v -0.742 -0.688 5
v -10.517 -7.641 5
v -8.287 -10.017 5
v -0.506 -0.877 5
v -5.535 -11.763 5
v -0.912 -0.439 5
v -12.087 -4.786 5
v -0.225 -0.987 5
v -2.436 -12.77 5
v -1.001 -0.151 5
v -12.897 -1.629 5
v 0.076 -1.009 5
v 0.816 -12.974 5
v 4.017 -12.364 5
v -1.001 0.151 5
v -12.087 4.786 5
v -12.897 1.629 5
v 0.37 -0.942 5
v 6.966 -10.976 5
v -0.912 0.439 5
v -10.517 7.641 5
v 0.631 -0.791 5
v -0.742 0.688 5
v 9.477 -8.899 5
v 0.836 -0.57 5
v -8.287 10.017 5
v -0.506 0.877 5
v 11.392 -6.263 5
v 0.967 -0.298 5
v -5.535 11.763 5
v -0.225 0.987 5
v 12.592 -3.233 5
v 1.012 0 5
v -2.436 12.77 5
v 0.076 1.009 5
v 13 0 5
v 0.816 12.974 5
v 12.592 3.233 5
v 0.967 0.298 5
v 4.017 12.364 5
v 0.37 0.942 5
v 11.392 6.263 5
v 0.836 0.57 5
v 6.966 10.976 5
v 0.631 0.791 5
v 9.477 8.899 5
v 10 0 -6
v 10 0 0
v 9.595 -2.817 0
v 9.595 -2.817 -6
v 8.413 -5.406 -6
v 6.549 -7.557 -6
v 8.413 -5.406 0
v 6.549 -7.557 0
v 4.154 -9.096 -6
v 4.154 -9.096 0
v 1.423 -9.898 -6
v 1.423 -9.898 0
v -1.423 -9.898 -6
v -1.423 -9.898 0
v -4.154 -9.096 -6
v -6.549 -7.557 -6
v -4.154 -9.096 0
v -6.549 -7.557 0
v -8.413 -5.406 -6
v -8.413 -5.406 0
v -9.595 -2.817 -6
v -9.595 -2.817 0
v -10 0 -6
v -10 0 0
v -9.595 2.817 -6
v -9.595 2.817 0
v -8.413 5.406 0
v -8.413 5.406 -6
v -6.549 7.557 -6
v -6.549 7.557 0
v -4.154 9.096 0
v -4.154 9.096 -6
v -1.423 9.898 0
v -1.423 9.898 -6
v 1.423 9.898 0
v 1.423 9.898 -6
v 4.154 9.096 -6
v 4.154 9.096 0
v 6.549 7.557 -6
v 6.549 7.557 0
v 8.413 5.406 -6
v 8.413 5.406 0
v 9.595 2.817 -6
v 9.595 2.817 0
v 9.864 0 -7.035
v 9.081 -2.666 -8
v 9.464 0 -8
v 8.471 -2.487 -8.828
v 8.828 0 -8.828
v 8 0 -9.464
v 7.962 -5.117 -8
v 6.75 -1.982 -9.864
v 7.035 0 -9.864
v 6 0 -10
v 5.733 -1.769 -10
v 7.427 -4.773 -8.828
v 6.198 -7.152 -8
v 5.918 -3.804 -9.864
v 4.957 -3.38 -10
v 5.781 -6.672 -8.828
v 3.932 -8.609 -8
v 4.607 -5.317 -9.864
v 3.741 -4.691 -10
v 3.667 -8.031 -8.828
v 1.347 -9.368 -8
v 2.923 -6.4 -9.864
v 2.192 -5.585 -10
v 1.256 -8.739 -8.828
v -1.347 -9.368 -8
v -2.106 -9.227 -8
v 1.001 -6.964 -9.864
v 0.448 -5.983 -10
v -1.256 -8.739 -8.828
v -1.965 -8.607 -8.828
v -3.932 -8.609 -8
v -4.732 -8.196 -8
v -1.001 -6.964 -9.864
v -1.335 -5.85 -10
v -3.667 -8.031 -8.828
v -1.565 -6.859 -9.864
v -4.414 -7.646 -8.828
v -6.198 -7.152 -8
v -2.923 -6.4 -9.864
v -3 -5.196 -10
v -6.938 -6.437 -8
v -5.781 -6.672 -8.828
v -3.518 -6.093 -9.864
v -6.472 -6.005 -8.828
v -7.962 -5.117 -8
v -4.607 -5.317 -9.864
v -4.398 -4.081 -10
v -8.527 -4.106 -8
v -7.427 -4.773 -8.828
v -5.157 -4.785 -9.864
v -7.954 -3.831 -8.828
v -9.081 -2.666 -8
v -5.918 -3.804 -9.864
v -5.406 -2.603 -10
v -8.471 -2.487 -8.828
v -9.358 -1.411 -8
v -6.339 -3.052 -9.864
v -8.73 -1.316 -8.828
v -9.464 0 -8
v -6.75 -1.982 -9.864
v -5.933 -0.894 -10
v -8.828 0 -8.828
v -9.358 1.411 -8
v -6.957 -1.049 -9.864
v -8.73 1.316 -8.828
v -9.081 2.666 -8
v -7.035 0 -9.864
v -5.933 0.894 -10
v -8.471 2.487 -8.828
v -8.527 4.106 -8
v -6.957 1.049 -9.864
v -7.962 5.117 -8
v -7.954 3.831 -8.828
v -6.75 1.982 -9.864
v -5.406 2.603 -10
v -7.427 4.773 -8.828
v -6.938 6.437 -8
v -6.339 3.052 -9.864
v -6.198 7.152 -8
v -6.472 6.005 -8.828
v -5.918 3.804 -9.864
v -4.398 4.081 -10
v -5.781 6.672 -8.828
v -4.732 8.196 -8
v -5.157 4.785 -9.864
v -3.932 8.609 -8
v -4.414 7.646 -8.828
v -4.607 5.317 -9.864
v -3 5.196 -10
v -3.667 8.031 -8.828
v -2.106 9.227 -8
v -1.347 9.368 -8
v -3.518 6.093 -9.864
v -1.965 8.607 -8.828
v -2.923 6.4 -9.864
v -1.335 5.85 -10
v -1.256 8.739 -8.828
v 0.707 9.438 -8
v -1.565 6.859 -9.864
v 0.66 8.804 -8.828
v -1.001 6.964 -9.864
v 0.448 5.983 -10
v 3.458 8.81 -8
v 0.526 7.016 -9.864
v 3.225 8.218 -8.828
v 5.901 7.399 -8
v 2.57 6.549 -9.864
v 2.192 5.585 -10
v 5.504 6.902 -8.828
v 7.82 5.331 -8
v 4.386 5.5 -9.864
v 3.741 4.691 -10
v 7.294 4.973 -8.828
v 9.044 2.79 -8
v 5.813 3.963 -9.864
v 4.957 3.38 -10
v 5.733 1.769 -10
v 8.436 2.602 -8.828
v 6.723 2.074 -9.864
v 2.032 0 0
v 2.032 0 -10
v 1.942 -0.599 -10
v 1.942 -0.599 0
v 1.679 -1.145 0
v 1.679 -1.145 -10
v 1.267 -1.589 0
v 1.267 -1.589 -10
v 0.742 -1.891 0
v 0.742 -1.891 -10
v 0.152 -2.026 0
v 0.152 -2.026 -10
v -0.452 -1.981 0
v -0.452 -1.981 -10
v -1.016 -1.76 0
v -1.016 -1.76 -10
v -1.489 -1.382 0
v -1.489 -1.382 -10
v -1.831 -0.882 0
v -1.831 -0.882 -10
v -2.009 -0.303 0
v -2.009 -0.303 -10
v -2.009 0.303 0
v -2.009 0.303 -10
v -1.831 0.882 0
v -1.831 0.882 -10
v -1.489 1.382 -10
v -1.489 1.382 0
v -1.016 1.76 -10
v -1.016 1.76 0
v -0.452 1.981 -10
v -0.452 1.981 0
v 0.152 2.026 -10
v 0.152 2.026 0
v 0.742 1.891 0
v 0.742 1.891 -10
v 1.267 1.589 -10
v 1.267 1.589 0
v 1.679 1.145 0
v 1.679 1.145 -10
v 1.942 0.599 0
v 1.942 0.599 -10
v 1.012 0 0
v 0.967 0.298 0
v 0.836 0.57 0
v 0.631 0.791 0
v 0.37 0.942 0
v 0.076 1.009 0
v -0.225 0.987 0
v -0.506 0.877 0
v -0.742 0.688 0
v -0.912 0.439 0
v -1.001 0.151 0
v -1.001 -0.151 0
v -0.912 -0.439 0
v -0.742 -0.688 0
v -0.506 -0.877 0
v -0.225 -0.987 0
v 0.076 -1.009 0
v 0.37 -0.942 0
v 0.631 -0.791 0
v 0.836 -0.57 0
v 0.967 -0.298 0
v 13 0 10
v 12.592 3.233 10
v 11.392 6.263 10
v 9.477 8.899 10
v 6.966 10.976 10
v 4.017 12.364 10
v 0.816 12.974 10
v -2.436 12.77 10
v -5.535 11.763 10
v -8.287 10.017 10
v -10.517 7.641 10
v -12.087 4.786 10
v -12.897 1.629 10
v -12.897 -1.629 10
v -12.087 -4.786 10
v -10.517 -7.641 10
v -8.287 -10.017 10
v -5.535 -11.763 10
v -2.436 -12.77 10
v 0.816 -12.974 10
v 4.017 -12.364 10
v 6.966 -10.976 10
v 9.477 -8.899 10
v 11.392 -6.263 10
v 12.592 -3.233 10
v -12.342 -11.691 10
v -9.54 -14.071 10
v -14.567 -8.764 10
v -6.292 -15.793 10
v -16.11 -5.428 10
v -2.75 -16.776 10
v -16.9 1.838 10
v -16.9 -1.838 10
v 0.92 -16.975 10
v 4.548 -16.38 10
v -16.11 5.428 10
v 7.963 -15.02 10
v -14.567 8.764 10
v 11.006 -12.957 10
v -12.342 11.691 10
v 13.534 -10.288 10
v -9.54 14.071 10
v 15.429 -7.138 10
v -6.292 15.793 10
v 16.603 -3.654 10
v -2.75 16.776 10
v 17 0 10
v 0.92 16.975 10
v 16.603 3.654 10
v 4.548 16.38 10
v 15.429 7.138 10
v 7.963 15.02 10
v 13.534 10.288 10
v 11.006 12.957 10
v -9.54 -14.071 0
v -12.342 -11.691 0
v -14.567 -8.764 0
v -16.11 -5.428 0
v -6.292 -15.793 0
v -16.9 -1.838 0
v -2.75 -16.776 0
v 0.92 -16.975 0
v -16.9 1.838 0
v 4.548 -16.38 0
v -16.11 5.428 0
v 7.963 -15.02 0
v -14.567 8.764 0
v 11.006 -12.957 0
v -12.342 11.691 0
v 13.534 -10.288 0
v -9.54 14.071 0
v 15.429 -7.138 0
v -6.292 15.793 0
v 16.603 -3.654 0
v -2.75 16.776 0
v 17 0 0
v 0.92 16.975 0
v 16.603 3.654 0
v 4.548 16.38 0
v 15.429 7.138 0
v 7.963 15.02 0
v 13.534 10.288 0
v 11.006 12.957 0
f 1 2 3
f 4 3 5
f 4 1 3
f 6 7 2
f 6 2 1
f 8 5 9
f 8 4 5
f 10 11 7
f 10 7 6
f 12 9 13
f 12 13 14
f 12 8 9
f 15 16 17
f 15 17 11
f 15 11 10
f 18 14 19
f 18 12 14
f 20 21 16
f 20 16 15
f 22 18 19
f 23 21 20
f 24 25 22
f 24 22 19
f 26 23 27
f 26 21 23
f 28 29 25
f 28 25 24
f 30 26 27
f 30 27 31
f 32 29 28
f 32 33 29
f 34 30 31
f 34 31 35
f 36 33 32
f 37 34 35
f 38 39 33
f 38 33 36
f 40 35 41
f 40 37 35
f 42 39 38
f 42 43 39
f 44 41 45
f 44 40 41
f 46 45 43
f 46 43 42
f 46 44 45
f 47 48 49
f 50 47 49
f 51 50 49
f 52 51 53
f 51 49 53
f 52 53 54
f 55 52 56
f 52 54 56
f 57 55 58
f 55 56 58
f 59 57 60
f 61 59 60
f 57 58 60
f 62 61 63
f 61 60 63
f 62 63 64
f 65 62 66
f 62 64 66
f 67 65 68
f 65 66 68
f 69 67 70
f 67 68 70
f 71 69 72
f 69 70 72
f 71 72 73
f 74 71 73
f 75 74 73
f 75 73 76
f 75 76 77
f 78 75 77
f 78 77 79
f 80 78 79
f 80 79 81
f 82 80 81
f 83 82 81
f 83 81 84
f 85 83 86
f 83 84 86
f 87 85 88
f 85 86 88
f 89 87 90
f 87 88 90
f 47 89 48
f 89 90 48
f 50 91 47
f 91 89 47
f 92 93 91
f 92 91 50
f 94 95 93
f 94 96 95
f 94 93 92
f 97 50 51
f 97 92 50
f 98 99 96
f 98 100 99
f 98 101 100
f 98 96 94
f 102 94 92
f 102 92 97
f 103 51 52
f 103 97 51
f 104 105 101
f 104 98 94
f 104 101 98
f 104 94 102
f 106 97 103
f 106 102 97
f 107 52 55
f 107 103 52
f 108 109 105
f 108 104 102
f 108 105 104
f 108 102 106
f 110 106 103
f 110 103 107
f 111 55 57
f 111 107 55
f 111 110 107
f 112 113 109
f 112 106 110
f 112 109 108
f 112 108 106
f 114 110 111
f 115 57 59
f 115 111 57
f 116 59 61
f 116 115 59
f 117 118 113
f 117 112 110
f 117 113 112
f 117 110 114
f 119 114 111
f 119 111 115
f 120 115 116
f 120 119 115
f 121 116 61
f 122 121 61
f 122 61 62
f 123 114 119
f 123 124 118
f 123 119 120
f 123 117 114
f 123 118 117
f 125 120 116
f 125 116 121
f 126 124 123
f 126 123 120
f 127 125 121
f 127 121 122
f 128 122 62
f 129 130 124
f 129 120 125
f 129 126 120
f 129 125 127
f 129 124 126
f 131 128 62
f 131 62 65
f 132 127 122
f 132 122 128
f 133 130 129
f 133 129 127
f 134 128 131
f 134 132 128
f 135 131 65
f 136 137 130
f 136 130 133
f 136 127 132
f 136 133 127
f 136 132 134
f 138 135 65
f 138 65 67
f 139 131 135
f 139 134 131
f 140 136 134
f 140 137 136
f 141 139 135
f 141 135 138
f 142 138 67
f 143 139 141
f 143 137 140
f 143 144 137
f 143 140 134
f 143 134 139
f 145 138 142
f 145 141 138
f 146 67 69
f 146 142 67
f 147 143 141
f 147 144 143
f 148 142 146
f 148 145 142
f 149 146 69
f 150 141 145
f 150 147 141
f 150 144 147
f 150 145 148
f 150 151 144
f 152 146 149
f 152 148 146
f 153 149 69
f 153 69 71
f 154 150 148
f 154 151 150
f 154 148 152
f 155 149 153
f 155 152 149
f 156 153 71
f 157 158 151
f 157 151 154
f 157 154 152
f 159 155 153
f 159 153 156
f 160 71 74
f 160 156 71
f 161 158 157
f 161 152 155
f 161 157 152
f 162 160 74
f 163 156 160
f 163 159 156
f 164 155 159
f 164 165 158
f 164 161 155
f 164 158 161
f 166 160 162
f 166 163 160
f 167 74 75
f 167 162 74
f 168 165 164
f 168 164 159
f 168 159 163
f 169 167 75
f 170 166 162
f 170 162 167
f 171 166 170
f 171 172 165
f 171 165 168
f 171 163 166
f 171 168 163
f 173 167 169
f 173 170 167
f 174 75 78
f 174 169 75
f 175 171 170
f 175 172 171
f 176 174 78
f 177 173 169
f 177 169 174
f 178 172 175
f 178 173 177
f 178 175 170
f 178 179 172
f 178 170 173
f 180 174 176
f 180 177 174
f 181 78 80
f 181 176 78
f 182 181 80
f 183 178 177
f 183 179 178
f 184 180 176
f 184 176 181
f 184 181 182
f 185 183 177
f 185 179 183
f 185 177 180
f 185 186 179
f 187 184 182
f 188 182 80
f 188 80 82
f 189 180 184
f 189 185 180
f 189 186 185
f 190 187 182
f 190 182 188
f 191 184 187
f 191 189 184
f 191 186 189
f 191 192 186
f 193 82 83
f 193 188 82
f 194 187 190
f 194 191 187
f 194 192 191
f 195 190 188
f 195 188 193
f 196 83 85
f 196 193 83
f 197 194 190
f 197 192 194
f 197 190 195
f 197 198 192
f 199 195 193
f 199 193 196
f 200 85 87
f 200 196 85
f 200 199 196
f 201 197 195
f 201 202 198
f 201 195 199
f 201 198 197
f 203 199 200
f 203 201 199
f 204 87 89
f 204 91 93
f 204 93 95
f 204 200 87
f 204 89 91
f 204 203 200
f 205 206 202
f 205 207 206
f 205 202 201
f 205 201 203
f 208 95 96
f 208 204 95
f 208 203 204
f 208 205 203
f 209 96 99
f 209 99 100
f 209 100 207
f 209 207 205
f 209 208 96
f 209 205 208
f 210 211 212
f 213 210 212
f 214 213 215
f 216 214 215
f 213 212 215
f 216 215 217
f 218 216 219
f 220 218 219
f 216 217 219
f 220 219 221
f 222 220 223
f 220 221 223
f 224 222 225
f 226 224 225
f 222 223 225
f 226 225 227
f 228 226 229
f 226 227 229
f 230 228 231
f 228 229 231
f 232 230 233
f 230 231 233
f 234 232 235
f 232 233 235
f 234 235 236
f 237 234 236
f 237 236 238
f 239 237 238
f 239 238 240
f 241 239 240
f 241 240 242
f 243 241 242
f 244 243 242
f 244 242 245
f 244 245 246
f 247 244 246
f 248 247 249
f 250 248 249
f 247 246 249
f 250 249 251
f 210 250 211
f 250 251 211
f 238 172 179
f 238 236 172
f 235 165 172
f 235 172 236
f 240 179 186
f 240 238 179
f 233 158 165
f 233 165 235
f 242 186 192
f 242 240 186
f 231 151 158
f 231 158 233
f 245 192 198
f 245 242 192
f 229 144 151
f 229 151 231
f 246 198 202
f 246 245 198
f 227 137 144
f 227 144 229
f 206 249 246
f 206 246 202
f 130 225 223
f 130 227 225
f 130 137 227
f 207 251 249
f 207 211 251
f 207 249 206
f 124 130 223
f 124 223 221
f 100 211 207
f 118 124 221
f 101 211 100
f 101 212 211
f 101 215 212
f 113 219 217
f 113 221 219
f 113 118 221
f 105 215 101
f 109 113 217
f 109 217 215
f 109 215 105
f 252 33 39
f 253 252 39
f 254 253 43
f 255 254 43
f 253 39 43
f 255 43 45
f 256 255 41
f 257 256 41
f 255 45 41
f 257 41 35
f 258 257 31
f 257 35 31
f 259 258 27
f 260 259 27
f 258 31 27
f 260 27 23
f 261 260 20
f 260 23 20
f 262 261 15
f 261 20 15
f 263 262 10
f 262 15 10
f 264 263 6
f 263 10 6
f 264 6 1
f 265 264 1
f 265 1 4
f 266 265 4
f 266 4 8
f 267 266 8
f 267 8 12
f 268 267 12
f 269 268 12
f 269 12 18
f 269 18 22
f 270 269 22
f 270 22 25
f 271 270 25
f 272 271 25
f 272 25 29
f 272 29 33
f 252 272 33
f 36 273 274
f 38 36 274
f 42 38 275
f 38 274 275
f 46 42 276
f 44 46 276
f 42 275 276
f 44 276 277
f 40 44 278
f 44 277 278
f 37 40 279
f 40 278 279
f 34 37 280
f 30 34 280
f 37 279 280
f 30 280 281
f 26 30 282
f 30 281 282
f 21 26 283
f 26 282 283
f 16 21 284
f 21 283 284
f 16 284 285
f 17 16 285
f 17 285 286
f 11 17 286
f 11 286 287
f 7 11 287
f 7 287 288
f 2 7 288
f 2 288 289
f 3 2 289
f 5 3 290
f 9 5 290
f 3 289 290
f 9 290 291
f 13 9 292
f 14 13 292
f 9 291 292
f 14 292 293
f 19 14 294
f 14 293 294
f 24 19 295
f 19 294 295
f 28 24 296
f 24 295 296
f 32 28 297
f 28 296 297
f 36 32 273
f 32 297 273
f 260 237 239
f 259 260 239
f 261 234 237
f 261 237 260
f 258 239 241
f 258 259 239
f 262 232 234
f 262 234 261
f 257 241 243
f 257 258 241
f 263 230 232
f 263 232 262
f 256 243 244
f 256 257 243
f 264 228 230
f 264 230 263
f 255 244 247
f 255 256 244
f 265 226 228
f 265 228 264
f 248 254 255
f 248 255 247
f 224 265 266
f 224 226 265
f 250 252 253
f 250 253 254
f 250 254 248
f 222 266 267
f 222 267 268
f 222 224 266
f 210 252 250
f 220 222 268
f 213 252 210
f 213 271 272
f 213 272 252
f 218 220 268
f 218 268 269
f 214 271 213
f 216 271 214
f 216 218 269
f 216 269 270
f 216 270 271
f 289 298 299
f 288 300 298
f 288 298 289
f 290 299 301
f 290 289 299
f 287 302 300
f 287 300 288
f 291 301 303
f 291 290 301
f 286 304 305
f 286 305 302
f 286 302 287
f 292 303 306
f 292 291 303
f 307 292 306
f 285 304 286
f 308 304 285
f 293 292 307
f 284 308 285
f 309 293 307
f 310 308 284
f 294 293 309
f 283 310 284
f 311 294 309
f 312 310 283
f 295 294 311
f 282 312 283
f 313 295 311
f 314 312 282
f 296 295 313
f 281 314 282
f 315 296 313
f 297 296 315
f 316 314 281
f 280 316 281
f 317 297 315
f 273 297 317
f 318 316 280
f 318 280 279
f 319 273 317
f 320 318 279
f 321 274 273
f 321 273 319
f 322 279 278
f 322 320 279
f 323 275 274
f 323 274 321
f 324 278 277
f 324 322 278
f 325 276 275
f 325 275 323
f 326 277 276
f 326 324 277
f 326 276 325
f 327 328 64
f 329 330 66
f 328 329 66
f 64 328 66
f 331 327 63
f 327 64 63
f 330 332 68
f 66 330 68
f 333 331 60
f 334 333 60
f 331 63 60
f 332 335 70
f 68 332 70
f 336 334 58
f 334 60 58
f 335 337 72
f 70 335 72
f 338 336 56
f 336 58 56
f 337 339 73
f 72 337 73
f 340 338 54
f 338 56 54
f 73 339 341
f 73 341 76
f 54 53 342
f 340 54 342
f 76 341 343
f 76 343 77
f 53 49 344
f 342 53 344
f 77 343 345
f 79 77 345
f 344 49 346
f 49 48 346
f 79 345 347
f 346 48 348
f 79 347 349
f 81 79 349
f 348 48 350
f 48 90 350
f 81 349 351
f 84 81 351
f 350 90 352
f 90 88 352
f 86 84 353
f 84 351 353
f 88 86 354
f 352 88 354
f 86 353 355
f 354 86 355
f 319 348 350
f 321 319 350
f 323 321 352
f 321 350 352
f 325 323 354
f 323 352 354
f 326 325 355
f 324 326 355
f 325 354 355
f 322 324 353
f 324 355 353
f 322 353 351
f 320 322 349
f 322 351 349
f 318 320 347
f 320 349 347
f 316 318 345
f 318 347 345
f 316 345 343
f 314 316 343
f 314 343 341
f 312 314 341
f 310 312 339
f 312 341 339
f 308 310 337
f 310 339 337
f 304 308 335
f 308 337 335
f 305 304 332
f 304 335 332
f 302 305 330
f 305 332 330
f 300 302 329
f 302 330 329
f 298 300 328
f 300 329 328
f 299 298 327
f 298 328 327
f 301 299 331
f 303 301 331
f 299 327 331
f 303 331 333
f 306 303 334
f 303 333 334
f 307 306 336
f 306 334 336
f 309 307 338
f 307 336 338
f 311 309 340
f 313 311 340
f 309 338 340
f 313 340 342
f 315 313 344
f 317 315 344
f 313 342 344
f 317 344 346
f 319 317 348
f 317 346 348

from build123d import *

# Parameters (mm, degrees)
CYLINDER_R      = 17
CYLINDER_DEPTH  = 10
SKETCH_R        = 13
POCKET_DEPTH    = 5
SKETCH001_R     = 10
PAD_DEPTH       = 10
FILLET_R        = 4
SKETCH002_R     = 2.03183
POCKET001_DEPTH = 10
SKETCH003_R     = 1.012126
POCKET002_DEPTH = 15.001


with BuildPart() as part:
    # Cylinder → Cylinder (new body)
    with BuildSketch(Plane.XY):
        Circle(CYLINDER_R)
    extrude(amount=CYLINDER_DEPTH)

    # Sketch → Pocket (cut)
    with BuildSketch(Plane.XY.offset(10)):
        Circle(SKETCH_R)
    extrude(amount=-POCKET_DEPTH, mode=Mode.SUBTRACT)

    # Sketch001 → Pad (new body)
    with BuildSketch(Plane(origin=(0, 0, 0), x_dir=(1, 0, 0), z_dir=(0, 0, -1))):
        Circle(SKETCH001_R)
    extrude(amount=PAD_DEPTH)

    # Fillet
    fillet_edges = [part.edges().sort_by_distance(p)[0] for p in [
        (-10, 0, -10),
    ]]
    fillet(fillet_edges, radius=FILLET_R)

    # Sketch002 → Pocket001 (cut)
    with BuildSketch(Plane(origin=(0, 0, -10), x_dir=(1, 0, 0), z_dir=(0, 0, -1))):
        Circle(SKETCH002_R)
    extrude(amount=-POCKET001_DEPTH, mode=Mode.SUBTRACT)

    # Sketch003 → Pocket002 (cut, through all)
    with BuildSketch(Plane.XY.offset(5)):
        Circle(SKETCH003_R)
    extrude(amount=-POCKET002_DEPTH, mode=Mode.SUBTRACT)


solid = part.part
